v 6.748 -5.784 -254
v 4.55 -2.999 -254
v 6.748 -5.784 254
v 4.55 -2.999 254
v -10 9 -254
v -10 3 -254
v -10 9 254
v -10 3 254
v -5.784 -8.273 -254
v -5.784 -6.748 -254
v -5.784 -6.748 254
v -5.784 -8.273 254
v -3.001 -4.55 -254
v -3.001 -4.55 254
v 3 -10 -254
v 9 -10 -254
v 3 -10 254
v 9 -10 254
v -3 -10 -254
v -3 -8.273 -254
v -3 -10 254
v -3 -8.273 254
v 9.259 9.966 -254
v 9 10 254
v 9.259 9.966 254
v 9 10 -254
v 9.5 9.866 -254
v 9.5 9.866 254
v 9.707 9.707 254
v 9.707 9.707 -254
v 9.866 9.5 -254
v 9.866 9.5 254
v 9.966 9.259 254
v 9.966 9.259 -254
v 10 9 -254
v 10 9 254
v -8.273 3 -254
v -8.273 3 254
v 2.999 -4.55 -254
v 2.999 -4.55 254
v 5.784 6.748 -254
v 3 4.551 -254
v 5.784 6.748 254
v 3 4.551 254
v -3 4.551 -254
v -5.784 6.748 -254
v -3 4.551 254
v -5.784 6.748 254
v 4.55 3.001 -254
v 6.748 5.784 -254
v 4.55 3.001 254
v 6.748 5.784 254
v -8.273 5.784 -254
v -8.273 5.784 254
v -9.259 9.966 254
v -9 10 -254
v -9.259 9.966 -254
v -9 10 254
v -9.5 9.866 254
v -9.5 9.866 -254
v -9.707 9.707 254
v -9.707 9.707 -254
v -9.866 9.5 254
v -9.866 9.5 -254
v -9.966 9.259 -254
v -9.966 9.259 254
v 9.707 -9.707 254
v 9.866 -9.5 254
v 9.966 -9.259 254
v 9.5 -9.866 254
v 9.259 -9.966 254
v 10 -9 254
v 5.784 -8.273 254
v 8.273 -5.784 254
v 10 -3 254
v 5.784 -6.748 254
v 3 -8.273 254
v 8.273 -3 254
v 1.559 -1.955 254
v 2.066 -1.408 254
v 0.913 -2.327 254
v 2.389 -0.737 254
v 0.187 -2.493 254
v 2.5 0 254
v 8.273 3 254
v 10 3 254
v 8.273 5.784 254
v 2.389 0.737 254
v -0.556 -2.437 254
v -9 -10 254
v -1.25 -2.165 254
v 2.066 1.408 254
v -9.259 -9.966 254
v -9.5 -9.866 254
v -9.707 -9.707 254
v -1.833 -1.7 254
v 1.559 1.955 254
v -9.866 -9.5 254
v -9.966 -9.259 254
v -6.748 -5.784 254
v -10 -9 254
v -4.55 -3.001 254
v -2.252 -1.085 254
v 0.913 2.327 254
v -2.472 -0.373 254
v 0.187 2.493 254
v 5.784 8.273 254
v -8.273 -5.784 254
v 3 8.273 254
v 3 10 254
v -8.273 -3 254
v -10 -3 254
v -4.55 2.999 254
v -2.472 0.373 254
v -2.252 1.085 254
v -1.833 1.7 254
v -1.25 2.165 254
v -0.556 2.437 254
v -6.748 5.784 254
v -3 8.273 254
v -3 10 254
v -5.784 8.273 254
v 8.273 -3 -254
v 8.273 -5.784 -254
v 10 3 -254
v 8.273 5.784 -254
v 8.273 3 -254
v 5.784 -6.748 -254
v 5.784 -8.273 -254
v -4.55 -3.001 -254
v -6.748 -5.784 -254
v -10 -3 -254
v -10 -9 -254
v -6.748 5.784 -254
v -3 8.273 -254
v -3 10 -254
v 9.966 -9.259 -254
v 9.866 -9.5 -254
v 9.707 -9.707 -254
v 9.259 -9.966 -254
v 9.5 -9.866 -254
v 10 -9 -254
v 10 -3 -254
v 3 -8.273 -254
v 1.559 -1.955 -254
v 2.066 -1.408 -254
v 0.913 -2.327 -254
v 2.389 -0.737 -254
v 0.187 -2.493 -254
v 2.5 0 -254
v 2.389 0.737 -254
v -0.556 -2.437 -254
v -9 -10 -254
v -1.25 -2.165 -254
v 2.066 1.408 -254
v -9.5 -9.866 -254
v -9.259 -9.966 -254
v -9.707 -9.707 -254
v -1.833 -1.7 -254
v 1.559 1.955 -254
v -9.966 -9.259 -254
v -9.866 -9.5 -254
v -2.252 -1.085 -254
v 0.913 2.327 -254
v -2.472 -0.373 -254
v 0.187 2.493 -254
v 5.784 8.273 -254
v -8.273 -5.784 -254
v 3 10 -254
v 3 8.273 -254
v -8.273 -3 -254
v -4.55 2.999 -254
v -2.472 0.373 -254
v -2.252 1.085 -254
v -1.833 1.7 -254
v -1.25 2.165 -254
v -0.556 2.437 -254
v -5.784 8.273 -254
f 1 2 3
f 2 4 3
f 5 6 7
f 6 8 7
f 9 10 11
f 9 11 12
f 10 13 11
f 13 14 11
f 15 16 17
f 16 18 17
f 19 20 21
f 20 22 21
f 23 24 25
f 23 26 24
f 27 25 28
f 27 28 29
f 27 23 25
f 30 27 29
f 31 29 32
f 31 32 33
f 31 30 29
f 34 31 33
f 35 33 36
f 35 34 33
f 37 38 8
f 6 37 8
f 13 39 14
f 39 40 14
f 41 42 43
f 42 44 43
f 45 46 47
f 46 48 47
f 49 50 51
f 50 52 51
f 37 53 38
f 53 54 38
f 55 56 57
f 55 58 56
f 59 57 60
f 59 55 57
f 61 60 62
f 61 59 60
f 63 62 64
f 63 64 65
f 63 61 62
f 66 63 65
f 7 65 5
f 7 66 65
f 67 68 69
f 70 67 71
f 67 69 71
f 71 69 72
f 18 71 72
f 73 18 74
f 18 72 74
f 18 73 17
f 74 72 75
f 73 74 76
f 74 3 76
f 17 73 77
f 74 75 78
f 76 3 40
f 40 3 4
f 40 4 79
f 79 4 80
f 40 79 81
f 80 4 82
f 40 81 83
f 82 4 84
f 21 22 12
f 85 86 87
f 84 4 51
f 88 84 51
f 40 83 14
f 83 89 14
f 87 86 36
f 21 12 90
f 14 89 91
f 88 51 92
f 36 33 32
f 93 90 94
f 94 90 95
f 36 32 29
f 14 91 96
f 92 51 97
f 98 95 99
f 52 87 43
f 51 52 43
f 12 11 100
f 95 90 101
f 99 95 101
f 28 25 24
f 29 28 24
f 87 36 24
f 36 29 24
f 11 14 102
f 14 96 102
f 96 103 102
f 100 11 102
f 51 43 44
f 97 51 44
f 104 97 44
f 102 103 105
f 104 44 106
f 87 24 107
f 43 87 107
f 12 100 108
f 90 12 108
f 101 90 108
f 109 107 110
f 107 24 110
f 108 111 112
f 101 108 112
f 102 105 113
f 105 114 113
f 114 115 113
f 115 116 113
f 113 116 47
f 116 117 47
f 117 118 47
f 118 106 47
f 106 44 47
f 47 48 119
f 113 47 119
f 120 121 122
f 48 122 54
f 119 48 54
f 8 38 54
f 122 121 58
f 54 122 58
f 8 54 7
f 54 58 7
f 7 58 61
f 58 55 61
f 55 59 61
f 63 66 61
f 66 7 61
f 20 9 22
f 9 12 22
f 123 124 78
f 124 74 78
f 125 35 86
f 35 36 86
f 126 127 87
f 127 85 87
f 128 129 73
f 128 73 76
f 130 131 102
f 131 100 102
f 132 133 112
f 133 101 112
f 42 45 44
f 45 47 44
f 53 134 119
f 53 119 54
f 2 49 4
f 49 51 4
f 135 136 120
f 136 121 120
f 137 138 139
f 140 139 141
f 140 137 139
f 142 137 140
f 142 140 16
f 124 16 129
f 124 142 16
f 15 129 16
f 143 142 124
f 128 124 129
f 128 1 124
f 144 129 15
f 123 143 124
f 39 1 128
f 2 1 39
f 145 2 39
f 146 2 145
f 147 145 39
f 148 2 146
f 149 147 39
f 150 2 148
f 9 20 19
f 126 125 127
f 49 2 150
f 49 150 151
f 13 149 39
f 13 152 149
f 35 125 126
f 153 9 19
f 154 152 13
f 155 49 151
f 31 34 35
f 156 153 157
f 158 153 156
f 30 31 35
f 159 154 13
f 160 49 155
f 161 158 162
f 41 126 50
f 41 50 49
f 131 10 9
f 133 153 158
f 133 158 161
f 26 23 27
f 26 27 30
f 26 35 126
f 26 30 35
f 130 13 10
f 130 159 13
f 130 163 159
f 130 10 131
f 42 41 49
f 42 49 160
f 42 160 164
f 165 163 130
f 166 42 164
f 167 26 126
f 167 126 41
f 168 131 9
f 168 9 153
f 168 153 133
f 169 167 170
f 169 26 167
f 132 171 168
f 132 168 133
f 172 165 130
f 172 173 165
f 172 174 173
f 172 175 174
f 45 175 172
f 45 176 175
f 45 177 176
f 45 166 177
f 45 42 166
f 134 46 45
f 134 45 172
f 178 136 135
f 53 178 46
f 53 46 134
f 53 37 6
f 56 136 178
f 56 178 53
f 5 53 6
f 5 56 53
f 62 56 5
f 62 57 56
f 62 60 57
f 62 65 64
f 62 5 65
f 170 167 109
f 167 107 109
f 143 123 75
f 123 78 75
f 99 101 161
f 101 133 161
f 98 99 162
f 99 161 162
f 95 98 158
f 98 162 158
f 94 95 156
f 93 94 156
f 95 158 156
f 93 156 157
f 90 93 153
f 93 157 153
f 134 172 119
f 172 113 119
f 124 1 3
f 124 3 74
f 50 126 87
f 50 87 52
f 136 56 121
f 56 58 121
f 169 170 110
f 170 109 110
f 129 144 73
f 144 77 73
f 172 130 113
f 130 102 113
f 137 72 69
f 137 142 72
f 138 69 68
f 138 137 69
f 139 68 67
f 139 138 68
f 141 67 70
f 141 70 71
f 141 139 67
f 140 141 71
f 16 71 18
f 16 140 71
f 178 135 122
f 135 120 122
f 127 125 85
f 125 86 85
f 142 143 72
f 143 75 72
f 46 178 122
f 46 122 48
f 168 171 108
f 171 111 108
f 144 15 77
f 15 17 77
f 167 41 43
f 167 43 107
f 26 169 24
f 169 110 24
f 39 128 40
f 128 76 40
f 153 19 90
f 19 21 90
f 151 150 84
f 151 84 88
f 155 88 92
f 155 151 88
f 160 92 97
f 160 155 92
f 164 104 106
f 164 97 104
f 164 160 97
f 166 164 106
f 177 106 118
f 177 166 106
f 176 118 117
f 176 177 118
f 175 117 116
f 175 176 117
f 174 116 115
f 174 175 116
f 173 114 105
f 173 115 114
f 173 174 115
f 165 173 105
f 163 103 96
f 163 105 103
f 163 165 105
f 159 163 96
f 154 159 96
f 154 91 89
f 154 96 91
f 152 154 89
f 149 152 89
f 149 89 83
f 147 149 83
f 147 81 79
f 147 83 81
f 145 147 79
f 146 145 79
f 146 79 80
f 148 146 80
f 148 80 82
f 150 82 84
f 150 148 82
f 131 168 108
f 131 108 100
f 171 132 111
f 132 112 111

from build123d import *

# Parameters (mm, degrees)
BOSS_EXTRUDE1_DEPTH     = 254
CUT_EXTRUDE1_DEPTH      = 509.196812269
CUT_EXTRUDE1_DEPTH_BACK = 509.196812269
SKETCH2_R               = 2.5
FILLET1_R               = 1
FILLET2_R               = 1


with BuildPart() as part:
    # Sketch1 → Boss-Extrude1 (new, symmetric)
    with BuildSketch(Plane.XY):
        Polygon((-10, 10), (-3, 10), (-3, 8.272610059), (-5.783778863, 8.272610059), (-5.783778863, 6.747994248), (-3, 4.550753814), (3, 4.550753814), (5.783778863, 6.747994248), (5.783778863, 8.272610059), (3, 8.272610059), (3, 10), (10, 10), (10, 3), (8.272610059, 3), (8.272610059, 5.783778863), (6.747994248, 5.783778863), (4.55, 3.000595152), (4.55, -2.999404848), (6.747994248, -5.783778863), (8.272610059, -5.783778863), (8.272610059, -3), (10, -3), (10, -10), (3, -10), (3, -8.272610059), (5.783778863, -8.272610059), (5.783778863, -6.747994248), (2.999404848, -4.55), (-3.000595152, -4.55), (-5.783778863, -6.747994248), (-5.783778863, -8.272610059), (-3, -8.272610059), (-3, -10), (-10, -10), (-10, -3), (-8.272610059, -3), (-8.272610059, -5.783778863), (-6.747994248, -5.783778863), (-4.55, -3.000595152), (-4.55, 2.999404848), (-6.747994248, 5.783778863), (-8.272610059, 5.783778863), (-8.272610059, 3), (-10, 3), align=None)
    extrude(amount=BOSS_EXTRUDE1_DEPTH, both=True)

    # Sketch2 → Cut-Extrude1 (cut, two sides: drawn at the far end of the back side and taken through both)
    with BuildSketch(Plane.XY.offset(254).offset(-CUT_EXTRUDE1_DEPTH_BACK)):
        Circle(SKETCH2_R)
    extrude(amount=CUT_EXTRUDE1_DEPTH + CUT_EXTRUDE1_DEPTH_BACK, mode=Mode.SUBTRACT)

    # Fillet1
    fillet1_edges = [part.edges().sort_by_distance(p)[0] for p in [
        (10, 10, 0),
    ]]
    fillet(fillet1_edges, radius=FILLET1_R)

    # Fillet2
    fillet2_edges = [part.edges().sort_by_distance(p)[0] for p in [
        (-10, 10, 0),
        (10, -10, 0),
        (-10, -10, 0),
    ]]
    fillet(fillet2_edges, radius=FILLET2_R)


solid = part.part
